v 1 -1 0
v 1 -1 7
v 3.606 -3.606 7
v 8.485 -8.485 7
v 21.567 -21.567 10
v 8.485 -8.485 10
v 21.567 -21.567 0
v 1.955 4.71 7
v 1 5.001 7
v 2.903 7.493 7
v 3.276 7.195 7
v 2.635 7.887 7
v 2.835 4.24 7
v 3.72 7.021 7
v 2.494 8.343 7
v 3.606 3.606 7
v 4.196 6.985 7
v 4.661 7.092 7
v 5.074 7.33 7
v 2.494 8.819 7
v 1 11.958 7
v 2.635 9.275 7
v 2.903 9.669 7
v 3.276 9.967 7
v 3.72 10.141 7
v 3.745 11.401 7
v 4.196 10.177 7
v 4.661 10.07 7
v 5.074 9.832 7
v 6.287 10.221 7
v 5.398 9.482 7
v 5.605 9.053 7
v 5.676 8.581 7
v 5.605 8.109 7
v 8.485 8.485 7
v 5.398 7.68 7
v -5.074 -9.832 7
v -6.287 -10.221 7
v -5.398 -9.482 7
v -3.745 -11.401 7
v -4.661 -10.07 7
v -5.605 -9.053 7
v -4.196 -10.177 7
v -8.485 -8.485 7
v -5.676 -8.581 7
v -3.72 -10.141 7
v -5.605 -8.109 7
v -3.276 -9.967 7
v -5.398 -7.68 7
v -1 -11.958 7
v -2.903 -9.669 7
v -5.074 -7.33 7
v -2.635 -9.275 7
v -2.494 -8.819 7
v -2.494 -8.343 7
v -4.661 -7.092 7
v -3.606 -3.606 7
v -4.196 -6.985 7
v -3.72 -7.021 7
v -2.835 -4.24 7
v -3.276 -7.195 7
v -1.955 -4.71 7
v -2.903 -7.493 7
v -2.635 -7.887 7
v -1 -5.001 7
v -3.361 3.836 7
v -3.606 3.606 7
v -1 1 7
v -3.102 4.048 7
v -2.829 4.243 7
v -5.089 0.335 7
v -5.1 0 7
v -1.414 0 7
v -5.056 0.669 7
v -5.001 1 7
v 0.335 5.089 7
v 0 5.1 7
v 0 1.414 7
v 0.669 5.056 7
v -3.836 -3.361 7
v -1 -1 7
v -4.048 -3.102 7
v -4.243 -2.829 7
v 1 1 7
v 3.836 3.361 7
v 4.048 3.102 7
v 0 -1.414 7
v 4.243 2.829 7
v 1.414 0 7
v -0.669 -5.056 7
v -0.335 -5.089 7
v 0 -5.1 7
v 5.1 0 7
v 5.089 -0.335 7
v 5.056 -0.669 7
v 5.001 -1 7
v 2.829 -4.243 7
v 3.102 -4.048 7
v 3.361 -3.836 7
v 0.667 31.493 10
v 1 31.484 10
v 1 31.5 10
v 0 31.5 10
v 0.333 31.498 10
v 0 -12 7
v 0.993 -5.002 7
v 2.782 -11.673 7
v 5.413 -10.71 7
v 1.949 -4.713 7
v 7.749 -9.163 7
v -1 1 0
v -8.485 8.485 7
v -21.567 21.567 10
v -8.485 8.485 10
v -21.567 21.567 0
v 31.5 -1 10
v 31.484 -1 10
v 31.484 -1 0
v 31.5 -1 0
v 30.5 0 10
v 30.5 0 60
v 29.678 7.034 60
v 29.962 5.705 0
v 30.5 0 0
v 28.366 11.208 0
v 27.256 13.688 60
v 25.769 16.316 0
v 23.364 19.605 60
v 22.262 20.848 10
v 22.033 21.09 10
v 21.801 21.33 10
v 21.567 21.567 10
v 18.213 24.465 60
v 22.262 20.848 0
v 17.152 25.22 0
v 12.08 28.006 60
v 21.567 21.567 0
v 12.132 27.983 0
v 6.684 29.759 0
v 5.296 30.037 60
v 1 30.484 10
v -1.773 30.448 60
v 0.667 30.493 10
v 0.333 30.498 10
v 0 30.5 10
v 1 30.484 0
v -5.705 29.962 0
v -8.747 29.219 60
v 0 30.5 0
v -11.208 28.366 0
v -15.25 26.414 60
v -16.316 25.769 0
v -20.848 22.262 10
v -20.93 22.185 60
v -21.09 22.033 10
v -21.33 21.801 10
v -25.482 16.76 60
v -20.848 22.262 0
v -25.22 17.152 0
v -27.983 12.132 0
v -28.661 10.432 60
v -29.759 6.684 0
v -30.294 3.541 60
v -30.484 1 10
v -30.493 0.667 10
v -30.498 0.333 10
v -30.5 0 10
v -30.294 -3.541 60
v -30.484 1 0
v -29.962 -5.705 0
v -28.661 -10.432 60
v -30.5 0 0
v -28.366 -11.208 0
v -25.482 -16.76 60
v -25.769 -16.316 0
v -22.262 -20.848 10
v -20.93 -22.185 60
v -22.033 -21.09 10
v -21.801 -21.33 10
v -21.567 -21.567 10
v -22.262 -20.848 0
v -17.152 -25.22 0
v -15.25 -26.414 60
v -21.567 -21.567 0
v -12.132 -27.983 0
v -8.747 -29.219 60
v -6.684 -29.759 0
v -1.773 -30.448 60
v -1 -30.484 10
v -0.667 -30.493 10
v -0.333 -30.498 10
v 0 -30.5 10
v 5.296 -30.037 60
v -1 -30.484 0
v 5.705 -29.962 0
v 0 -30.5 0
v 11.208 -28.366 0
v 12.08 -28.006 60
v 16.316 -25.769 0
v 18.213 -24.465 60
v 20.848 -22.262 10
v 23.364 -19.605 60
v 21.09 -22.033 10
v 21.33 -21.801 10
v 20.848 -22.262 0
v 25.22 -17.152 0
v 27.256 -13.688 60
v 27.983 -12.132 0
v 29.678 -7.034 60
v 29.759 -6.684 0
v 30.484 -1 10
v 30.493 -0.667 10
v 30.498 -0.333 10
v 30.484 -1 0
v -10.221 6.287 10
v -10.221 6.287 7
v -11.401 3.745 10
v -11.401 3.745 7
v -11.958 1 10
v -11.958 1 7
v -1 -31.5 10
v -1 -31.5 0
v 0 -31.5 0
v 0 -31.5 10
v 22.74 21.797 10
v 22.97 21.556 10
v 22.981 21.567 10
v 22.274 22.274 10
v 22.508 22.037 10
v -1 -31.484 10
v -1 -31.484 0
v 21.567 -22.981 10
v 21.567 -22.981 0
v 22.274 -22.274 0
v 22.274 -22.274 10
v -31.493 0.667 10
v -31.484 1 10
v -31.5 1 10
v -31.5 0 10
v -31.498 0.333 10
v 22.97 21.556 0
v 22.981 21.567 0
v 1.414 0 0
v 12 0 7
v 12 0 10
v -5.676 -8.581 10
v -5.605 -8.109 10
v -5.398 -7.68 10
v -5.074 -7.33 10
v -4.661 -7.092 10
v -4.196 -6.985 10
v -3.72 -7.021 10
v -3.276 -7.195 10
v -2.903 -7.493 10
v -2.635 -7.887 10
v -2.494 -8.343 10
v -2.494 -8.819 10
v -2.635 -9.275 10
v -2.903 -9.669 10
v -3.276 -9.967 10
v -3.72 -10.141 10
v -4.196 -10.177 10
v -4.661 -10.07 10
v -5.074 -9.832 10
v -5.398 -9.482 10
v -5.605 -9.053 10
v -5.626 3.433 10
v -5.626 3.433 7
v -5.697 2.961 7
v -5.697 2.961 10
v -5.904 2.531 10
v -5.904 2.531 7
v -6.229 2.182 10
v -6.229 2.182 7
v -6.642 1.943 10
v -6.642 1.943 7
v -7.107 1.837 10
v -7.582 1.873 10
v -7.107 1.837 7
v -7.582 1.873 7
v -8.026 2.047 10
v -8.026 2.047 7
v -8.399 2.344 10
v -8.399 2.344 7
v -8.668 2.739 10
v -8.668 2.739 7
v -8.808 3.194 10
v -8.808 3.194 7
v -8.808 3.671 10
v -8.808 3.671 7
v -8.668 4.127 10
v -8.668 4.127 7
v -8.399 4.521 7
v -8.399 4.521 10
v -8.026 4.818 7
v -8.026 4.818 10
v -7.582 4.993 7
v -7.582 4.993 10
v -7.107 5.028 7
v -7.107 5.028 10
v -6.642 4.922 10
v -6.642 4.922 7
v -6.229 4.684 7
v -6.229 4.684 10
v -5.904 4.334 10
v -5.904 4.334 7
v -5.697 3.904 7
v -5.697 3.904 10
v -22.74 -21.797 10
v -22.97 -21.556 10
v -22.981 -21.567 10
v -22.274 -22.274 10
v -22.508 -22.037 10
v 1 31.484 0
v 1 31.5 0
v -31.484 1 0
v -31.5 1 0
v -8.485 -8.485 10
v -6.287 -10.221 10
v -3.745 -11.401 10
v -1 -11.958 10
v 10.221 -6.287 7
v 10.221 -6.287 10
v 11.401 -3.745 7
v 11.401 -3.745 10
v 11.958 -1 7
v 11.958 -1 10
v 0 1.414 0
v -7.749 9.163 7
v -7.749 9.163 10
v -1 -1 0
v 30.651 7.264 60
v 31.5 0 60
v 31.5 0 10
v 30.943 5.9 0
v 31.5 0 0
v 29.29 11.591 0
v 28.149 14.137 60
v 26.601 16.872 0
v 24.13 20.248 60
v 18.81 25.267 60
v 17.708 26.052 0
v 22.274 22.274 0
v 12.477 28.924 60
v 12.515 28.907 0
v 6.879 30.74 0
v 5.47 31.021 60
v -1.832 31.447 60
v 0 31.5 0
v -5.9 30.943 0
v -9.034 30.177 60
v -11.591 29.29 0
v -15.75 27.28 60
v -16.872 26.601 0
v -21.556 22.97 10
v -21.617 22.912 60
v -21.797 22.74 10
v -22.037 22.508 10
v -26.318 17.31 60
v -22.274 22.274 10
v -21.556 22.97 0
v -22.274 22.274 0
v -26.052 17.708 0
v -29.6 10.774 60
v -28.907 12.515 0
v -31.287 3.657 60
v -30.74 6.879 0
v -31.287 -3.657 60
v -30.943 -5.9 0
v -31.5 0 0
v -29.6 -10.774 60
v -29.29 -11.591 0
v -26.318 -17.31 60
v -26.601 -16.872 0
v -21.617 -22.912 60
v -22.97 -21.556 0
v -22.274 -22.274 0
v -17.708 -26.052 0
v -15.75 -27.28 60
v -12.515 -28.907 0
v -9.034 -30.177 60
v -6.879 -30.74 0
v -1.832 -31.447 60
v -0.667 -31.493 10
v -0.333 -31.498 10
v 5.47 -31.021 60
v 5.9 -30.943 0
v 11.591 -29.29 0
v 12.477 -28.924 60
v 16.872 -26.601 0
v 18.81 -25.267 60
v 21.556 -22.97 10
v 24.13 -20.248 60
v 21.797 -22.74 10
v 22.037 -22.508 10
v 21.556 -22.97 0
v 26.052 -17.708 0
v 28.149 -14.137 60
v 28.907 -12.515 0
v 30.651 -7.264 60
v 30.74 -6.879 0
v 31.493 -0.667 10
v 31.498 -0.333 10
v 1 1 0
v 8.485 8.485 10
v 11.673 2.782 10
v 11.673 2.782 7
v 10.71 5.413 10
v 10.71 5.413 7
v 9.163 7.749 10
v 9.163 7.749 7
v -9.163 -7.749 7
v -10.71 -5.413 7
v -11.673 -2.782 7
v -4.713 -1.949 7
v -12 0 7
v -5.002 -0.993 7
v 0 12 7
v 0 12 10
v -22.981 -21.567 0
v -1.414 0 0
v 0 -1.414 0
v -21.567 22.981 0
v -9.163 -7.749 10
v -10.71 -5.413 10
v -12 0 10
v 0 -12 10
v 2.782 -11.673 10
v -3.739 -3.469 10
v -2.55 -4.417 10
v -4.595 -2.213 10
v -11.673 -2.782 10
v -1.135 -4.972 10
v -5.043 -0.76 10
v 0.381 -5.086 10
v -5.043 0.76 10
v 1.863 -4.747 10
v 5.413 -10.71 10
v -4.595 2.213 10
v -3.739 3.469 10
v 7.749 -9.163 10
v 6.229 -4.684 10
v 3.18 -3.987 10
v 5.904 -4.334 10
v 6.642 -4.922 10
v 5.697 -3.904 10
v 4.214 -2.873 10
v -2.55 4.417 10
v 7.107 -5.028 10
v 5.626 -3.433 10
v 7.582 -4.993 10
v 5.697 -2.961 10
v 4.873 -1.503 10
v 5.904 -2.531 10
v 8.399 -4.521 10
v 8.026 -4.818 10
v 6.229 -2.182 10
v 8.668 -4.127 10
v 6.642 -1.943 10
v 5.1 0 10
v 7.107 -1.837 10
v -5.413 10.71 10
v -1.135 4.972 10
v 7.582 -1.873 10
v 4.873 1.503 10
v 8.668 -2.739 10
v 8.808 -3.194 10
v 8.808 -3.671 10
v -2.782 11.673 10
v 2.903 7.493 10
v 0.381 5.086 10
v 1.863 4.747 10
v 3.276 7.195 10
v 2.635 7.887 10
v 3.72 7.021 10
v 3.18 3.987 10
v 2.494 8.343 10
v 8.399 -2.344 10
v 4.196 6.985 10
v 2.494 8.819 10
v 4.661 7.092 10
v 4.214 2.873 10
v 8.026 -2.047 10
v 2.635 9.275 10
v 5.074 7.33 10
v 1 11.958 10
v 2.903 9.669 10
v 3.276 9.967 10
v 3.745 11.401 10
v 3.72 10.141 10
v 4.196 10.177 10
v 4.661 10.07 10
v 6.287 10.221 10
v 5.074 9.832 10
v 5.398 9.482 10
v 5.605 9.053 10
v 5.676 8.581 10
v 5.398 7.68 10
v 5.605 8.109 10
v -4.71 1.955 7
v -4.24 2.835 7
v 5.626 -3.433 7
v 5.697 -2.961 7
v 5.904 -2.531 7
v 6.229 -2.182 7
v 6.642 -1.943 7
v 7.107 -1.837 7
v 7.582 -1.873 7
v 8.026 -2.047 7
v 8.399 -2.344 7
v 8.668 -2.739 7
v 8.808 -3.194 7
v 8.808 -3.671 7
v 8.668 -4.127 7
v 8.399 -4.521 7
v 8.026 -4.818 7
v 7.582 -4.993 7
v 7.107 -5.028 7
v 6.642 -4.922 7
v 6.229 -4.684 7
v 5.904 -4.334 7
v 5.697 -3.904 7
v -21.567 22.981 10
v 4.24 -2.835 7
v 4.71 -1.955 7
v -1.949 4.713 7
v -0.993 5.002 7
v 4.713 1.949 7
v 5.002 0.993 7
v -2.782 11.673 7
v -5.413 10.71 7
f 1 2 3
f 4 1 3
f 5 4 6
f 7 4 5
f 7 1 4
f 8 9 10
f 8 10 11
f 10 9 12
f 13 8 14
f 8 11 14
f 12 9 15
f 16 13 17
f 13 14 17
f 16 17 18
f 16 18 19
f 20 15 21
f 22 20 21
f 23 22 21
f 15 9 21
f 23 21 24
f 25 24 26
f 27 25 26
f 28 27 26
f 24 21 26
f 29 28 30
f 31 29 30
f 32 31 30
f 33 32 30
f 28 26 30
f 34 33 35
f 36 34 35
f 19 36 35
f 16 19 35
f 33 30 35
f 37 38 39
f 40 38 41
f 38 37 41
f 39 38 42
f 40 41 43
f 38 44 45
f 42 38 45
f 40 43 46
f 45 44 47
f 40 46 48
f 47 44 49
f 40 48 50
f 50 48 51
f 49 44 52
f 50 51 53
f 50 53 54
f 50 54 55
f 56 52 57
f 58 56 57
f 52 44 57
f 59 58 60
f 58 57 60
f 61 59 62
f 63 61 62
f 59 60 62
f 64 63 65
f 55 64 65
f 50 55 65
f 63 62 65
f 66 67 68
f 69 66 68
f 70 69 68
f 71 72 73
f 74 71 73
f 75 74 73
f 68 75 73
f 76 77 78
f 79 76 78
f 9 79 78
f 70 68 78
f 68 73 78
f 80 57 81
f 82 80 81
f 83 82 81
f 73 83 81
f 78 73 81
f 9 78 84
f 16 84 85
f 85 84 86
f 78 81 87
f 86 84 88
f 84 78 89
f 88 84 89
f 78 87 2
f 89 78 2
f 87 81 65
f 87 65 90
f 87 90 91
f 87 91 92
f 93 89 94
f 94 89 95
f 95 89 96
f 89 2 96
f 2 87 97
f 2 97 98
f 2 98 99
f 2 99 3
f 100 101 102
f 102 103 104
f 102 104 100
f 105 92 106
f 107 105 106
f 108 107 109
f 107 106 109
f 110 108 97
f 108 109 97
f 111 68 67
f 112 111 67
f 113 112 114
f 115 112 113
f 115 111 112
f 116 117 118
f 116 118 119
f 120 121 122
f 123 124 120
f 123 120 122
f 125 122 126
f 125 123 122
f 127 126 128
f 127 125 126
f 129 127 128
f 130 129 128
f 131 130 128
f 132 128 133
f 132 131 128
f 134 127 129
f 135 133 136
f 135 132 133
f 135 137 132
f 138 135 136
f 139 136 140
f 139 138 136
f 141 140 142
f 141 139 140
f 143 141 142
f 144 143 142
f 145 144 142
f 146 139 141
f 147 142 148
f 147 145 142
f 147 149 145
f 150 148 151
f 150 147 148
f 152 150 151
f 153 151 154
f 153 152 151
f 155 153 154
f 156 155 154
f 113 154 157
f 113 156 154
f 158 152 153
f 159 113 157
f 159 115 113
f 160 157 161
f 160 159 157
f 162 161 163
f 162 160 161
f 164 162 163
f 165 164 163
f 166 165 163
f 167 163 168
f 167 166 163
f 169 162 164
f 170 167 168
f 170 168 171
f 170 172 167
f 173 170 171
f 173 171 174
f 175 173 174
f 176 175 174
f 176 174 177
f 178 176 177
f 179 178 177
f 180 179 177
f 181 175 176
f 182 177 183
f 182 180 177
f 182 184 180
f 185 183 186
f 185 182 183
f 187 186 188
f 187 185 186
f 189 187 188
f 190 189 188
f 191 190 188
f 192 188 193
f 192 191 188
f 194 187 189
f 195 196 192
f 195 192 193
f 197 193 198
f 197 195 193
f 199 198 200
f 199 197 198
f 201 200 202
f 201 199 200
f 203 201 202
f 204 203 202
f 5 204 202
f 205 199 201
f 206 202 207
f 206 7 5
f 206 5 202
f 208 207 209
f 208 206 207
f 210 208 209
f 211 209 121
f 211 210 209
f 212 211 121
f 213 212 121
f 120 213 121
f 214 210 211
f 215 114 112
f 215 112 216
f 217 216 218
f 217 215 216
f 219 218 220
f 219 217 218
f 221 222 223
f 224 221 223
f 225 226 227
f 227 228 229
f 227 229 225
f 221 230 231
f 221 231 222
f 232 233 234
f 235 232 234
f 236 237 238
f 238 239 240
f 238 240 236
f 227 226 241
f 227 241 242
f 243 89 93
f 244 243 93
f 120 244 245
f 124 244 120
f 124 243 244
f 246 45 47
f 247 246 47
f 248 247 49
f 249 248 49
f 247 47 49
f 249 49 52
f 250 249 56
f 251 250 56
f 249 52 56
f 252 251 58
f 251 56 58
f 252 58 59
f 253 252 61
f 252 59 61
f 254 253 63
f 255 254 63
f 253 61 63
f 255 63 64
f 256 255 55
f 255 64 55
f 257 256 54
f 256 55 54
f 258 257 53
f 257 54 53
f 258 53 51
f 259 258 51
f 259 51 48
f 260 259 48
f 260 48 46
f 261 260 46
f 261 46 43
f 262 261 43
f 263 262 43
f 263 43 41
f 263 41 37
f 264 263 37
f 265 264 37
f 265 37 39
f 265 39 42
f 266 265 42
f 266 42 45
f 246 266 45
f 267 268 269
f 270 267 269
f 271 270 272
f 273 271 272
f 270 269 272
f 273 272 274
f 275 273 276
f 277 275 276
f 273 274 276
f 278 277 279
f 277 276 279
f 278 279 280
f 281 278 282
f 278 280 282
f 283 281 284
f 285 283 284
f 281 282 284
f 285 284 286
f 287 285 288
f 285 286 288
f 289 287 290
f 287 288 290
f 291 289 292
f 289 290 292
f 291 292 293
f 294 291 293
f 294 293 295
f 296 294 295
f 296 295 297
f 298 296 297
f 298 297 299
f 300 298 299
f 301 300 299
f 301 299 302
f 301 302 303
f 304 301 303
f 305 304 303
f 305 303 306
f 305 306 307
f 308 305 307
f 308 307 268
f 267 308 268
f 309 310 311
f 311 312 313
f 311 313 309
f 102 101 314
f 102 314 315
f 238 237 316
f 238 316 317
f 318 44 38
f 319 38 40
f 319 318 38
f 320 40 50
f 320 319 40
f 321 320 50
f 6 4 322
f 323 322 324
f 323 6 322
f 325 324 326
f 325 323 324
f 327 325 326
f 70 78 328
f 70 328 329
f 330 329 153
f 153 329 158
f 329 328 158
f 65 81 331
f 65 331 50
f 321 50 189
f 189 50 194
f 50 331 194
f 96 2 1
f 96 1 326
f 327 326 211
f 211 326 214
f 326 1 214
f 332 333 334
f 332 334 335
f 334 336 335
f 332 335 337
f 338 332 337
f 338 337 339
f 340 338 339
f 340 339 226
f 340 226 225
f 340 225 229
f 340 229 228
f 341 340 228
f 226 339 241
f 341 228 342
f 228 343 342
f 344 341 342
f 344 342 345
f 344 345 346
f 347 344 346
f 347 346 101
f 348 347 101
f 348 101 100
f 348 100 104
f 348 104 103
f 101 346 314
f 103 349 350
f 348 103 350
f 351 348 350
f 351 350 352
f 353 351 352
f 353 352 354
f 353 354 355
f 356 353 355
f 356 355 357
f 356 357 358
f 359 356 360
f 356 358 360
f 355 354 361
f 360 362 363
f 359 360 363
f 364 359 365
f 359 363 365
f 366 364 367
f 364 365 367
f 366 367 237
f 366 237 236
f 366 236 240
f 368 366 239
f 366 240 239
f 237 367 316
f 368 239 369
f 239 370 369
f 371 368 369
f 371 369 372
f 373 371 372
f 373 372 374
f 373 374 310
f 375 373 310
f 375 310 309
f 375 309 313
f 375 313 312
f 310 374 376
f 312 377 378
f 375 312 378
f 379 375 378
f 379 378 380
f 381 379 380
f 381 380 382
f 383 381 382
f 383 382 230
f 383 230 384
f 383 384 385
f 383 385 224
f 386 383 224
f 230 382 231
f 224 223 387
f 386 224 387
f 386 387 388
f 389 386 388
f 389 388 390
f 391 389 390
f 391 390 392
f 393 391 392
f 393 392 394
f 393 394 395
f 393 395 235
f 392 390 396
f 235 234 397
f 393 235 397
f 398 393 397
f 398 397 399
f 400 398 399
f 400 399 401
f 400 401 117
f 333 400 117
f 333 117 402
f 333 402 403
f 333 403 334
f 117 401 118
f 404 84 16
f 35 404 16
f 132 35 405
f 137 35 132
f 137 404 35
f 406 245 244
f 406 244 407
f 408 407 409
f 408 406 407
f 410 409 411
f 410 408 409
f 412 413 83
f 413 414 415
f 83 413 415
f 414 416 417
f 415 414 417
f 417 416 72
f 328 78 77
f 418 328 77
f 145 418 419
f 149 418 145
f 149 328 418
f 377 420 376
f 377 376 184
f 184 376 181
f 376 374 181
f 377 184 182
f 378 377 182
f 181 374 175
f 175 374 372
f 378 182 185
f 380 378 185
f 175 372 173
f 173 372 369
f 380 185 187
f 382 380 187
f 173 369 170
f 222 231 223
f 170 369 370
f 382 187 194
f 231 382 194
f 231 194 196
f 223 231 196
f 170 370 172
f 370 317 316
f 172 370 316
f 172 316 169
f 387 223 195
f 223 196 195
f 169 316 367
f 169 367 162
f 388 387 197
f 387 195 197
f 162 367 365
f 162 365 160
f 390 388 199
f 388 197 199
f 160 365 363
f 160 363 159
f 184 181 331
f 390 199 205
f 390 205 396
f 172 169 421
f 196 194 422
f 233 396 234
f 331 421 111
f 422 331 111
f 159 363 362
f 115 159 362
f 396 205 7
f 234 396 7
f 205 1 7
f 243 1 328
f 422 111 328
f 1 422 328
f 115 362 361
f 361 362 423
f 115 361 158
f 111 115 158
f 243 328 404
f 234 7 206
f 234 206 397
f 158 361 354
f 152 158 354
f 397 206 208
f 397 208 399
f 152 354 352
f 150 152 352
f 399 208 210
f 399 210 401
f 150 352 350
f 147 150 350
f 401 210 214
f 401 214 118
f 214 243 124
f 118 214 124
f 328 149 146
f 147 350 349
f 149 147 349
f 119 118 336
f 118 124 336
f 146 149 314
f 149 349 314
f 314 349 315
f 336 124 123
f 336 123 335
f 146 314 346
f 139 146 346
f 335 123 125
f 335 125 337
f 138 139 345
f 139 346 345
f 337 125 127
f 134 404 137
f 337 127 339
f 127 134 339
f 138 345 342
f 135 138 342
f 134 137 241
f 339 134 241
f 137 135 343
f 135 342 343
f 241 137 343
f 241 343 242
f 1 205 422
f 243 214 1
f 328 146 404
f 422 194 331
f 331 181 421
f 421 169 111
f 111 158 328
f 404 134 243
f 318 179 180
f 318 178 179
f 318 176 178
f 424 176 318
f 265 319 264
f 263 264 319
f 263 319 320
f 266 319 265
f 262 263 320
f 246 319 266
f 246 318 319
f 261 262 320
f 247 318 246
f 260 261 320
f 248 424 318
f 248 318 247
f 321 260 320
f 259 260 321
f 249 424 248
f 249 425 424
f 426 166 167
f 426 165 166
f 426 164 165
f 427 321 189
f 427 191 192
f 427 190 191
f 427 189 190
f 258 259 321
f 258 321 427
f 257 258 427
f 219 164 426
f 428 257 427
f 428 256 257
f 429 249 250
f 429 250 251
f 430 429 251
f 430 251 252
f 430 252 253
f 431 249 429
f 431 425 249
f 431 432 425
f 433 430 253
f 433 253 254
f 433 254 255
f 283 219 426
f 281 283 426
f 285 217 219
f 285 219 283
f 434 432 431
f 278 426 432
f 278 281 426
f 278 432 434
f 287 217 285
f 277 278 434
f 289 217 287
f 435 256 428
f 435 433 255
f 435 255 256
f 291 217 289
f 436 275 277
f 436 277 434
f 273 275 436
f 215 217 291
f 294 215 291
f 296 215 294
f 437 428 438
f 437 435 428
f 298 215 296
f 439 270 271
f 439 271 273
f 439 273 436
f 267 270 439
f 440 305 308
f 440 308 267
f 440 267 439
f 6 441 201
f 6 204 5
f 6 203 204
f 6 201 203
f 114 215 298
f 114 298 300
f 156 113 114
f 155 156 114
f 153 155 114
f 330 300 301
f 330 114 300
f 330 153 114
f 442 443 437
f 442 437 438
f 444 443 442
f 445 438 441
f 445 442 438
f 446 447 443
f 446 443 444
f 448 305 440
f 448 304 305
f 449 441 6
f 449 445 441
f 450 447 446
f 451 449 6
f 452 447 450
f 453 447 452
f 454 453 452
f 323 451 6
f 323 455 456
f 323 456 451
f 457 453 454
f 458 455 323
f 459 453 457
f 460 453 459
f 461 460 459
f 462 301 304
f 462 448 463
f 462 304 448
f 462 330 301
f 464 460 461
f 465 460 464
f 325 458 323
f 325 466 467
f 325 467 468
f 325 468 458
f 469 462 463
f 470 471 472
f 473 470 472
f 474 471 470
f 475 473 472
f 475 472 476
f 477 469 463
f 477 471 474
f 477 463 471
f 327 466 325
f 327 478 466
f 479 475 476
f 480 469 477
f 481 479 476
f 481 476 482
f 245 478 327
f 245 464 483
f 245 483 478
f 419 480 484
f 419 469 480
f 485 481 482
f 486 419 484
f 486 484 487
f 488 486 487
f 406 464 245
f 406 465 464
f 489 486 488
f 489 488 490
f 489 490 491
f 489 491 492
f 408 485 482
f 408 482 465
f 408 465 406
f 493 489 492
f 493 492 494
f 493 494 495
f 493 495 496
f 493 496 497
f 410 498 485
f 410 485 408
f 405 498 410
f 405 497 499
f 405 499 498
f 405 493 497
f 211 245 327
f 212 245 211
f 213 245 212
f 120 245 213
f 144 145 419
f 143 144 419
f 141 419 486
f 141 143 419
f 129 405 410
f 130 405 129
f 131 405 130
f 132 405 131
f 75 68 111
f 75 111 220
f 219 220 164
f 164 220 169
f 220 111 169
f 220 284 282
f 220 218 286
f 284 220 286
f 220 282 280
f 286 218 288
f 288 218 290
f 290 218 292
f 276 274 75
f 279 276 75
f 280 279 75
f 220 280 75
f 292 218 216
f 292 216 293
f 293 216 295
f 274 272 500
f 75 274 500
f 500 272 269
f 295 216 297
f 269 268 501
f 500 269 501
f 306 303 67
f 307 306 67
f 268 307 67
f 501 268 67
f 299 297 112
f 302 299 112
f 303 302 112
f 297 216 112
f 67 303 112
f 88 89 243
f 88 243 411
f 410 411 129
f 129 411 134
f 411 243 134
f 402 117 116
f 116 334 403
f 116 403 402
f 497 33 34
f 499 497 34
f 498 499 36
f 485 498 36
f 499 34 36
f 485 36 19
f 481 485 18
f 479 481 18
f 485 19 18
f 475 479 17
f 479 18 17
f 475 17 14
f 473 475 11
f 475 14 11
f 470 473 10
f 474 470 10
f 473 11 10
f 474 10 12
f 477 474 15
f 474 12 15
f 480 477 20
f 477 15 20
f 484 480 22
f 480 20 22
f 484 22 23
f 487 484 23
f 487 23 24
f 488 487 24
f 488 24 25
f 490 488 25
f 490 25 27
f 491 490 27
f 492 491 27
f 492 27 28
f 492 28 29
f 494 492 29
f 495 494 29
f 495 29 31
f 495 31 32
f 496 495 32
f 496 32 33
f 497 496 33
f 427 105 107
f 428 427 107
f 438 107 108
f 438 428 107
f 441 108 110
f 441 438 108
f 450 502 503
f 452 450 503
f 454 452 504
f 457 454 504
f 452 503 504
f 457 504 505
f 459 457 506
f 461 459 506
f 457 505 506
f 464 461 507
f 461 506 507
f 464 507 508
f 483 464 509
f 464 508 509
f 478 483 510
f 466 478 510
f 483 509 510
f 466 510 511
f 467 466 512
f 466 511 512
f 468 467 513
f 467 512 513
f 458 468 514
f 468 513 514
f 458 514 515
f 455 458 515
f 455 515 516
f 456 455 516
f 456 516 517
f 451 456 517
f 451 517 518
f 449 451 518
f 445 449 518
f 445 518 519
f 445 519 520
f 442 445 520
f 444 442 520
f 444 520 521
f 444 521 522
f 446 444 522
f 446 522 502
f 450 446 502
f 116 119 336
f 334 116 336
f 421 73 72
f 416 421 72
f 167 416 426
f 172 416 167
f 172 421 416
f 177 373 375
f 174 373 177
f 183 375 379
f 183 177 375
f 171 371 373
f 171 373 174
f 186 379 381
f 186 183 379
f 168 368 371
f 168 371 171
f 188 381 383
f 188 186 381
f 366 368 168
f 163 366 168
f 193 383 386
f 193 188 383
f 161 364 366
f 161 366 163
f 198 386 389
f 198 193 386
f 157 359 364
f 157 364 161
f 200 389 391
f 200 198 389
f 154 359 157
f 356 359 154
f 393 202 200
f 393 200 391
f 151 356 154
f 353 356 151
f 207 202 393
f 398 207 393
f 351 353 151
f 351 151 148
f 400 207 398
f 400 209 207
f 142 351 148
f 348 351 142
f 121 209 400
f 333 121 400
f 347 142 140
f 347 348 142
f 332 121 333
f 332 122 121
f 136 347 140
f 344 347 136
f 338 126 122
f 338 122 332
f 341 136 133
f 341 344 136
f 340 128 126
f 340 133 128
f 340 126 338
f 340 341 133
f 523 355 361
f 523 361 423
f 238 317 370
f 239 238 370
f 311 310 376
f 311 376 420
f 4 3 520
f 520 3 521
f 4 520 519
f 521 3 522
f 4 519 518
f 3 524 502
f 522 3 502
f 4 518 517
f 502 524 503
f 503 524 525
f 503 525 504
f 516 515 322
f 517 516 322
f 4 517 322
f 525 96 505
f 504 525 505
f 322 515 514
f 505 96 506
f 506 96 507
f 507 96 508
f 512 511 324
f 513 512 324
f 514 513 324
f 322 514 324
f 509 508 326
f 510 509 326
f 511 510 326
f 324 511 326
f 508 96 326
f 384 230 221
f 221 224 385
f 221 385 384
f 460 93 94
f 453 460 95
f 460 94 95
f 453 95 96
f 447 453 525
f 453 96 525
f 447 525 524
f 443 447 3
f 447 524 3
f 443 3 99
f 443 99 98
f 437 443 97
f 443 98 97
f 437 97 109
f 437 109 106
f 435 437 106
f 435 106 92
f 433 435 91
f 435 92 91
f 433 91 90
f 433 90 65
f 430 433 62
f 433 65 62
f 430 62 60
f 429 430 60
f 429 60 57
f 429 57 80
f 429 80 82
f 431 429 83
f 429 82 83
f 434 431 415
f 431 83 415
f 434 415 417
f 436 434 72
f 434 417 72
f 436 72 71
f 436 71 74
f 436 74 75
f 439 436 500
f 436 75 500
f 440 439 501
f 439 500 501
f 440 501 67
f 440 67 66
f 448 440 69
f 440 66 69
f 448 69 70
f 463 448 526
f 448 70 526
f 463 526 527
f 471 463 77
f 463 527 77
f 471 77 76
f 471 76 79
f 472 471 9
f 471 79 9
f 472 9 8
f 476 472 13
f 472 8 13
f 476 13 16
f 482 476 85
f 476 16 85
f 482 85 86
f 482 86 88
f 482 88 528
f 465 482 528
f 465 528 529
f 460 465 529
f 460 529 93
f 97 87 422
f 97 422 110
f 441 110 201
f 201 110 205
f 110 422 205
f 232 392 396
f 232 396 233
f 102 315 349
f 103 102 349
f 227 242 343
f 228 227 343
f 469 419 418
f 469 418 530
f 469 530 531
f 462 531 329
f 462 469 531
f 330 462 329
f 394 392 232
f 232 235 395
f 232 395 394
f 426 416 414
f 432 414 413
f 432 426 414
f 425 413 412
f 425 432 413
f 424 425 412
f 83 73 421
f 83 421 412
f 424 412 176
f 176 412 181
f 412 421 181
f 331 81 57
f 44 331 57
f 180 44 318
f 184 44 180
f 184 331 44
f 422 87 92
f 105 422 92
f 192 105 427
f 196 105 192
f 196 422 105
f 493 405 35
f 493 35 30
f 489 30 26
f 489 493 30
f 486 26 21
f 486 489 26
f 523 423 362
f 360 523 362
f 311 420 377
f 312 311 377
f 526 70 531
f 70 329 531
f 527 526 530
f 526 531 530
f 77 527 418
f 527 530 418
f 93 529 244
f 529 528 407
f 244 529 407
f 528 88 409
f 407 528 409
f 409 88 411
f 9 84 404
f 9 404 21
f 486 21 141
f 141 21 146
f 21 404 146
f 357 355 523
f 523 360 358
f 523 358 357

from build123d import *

# Parameters (mm, degrees)
SKETCH_1_R               = 31.5
SKETCH_1_R_2             = 30.5
EXTRUDE_1_DEPTH          = 60
SKETCH_2_W               = 31.5
SKETCH_2_H               = 1
EXTRUDE_1_2_DEPTH        = 10
PATTERN_CIRCULAR_1_COUNT = 8
SKETCH_3_R               = 12
EXTRUDE_2_DEPTH          = 3
SKETCH_4_R               = 1.6
SKETCH_4_R_2             = 5.1
CUT_EXTRUDE_1_DEPTH      = 5
PATTERN_CIRCULAR_3_COUNT = 2


with BuildPart() as part:
    # 草图1 → Extrude 1 (new body)
    with BuildSketch(Plane.XY):
        Circle(SKETCH_1_R)
        Circle(SKETCH_1_R_2, mode=Mode.SUBTRACT)
    extrude(amount=EXTRUDE_1_DEPTH)

    # 草图2 → Extrude 1 2 (add)
    with BuildSketch(Plane.XY):
        with Locations((15.75, -0.5)):
            Rectangle(SKETCH_2_W, SKETCH_2_H)
    extrude_1_2 = extrude(amount=EXTRUDE_1_2_DEPTH)

    # 阵列(圆周)1: Extrude 1 2 ×8 about axis
    pattern_circular_1_axis = Axis((0, 0, 0), (0, 0, 1))
    for i in range(1, PATTERN_CIRCULAR_1_COUNT):
        add(extrude_1_2.rotate(pattern_circular_1_axis, i * 360 / PATTERN_CIRCULAR_1_COUNT))

    # 草图3 → 凸台-拉伸2 (add)
    with BuildSketch(Plane.XY.offset(10)):
        Circle(SKETCH_3_R)
    extrude(amount=-EXTRUDE_2_DEPTH)

    # 草图4 → 切除-拉伸1 (cut)
    with BuildSketch(Plane(origin=(0, 0, 7), x_dir=(-1, 0, 0), z_dir=(0, 0, -1))):
        with Locations((-7.22609389, -3.432720072)):
            Circle(SKETCH_4_R)
        with Locations((4.076355085, -8.580986494)):
            Circle(SKETCH_4_R)
        with Locations(Location((0, 0, 0), (0, 0, 180))):
            Circle(SKETCH_4_R_2)
    cut_extrude_1 = extrude(amount=-CUT_EXTRUDE_1_DEPTH, mode=Mode.SUBTRACT)

    # 阵列(圆周)3: 切除-拉伸1 ×2 about axis
    pattern_circular_3_axis = Axis((0, 0, 0), (0, 0, 1))
    for i in range(1, PATTERN_CIRCULAR_3_COUNT):
        add(cut_extrude_1.rotate(pattern_circular_3_axis, i * 360 / PATTERN_CIRCULAR_3_COUNT), mode=Mode.SUBTRACT)


solid = part.part
